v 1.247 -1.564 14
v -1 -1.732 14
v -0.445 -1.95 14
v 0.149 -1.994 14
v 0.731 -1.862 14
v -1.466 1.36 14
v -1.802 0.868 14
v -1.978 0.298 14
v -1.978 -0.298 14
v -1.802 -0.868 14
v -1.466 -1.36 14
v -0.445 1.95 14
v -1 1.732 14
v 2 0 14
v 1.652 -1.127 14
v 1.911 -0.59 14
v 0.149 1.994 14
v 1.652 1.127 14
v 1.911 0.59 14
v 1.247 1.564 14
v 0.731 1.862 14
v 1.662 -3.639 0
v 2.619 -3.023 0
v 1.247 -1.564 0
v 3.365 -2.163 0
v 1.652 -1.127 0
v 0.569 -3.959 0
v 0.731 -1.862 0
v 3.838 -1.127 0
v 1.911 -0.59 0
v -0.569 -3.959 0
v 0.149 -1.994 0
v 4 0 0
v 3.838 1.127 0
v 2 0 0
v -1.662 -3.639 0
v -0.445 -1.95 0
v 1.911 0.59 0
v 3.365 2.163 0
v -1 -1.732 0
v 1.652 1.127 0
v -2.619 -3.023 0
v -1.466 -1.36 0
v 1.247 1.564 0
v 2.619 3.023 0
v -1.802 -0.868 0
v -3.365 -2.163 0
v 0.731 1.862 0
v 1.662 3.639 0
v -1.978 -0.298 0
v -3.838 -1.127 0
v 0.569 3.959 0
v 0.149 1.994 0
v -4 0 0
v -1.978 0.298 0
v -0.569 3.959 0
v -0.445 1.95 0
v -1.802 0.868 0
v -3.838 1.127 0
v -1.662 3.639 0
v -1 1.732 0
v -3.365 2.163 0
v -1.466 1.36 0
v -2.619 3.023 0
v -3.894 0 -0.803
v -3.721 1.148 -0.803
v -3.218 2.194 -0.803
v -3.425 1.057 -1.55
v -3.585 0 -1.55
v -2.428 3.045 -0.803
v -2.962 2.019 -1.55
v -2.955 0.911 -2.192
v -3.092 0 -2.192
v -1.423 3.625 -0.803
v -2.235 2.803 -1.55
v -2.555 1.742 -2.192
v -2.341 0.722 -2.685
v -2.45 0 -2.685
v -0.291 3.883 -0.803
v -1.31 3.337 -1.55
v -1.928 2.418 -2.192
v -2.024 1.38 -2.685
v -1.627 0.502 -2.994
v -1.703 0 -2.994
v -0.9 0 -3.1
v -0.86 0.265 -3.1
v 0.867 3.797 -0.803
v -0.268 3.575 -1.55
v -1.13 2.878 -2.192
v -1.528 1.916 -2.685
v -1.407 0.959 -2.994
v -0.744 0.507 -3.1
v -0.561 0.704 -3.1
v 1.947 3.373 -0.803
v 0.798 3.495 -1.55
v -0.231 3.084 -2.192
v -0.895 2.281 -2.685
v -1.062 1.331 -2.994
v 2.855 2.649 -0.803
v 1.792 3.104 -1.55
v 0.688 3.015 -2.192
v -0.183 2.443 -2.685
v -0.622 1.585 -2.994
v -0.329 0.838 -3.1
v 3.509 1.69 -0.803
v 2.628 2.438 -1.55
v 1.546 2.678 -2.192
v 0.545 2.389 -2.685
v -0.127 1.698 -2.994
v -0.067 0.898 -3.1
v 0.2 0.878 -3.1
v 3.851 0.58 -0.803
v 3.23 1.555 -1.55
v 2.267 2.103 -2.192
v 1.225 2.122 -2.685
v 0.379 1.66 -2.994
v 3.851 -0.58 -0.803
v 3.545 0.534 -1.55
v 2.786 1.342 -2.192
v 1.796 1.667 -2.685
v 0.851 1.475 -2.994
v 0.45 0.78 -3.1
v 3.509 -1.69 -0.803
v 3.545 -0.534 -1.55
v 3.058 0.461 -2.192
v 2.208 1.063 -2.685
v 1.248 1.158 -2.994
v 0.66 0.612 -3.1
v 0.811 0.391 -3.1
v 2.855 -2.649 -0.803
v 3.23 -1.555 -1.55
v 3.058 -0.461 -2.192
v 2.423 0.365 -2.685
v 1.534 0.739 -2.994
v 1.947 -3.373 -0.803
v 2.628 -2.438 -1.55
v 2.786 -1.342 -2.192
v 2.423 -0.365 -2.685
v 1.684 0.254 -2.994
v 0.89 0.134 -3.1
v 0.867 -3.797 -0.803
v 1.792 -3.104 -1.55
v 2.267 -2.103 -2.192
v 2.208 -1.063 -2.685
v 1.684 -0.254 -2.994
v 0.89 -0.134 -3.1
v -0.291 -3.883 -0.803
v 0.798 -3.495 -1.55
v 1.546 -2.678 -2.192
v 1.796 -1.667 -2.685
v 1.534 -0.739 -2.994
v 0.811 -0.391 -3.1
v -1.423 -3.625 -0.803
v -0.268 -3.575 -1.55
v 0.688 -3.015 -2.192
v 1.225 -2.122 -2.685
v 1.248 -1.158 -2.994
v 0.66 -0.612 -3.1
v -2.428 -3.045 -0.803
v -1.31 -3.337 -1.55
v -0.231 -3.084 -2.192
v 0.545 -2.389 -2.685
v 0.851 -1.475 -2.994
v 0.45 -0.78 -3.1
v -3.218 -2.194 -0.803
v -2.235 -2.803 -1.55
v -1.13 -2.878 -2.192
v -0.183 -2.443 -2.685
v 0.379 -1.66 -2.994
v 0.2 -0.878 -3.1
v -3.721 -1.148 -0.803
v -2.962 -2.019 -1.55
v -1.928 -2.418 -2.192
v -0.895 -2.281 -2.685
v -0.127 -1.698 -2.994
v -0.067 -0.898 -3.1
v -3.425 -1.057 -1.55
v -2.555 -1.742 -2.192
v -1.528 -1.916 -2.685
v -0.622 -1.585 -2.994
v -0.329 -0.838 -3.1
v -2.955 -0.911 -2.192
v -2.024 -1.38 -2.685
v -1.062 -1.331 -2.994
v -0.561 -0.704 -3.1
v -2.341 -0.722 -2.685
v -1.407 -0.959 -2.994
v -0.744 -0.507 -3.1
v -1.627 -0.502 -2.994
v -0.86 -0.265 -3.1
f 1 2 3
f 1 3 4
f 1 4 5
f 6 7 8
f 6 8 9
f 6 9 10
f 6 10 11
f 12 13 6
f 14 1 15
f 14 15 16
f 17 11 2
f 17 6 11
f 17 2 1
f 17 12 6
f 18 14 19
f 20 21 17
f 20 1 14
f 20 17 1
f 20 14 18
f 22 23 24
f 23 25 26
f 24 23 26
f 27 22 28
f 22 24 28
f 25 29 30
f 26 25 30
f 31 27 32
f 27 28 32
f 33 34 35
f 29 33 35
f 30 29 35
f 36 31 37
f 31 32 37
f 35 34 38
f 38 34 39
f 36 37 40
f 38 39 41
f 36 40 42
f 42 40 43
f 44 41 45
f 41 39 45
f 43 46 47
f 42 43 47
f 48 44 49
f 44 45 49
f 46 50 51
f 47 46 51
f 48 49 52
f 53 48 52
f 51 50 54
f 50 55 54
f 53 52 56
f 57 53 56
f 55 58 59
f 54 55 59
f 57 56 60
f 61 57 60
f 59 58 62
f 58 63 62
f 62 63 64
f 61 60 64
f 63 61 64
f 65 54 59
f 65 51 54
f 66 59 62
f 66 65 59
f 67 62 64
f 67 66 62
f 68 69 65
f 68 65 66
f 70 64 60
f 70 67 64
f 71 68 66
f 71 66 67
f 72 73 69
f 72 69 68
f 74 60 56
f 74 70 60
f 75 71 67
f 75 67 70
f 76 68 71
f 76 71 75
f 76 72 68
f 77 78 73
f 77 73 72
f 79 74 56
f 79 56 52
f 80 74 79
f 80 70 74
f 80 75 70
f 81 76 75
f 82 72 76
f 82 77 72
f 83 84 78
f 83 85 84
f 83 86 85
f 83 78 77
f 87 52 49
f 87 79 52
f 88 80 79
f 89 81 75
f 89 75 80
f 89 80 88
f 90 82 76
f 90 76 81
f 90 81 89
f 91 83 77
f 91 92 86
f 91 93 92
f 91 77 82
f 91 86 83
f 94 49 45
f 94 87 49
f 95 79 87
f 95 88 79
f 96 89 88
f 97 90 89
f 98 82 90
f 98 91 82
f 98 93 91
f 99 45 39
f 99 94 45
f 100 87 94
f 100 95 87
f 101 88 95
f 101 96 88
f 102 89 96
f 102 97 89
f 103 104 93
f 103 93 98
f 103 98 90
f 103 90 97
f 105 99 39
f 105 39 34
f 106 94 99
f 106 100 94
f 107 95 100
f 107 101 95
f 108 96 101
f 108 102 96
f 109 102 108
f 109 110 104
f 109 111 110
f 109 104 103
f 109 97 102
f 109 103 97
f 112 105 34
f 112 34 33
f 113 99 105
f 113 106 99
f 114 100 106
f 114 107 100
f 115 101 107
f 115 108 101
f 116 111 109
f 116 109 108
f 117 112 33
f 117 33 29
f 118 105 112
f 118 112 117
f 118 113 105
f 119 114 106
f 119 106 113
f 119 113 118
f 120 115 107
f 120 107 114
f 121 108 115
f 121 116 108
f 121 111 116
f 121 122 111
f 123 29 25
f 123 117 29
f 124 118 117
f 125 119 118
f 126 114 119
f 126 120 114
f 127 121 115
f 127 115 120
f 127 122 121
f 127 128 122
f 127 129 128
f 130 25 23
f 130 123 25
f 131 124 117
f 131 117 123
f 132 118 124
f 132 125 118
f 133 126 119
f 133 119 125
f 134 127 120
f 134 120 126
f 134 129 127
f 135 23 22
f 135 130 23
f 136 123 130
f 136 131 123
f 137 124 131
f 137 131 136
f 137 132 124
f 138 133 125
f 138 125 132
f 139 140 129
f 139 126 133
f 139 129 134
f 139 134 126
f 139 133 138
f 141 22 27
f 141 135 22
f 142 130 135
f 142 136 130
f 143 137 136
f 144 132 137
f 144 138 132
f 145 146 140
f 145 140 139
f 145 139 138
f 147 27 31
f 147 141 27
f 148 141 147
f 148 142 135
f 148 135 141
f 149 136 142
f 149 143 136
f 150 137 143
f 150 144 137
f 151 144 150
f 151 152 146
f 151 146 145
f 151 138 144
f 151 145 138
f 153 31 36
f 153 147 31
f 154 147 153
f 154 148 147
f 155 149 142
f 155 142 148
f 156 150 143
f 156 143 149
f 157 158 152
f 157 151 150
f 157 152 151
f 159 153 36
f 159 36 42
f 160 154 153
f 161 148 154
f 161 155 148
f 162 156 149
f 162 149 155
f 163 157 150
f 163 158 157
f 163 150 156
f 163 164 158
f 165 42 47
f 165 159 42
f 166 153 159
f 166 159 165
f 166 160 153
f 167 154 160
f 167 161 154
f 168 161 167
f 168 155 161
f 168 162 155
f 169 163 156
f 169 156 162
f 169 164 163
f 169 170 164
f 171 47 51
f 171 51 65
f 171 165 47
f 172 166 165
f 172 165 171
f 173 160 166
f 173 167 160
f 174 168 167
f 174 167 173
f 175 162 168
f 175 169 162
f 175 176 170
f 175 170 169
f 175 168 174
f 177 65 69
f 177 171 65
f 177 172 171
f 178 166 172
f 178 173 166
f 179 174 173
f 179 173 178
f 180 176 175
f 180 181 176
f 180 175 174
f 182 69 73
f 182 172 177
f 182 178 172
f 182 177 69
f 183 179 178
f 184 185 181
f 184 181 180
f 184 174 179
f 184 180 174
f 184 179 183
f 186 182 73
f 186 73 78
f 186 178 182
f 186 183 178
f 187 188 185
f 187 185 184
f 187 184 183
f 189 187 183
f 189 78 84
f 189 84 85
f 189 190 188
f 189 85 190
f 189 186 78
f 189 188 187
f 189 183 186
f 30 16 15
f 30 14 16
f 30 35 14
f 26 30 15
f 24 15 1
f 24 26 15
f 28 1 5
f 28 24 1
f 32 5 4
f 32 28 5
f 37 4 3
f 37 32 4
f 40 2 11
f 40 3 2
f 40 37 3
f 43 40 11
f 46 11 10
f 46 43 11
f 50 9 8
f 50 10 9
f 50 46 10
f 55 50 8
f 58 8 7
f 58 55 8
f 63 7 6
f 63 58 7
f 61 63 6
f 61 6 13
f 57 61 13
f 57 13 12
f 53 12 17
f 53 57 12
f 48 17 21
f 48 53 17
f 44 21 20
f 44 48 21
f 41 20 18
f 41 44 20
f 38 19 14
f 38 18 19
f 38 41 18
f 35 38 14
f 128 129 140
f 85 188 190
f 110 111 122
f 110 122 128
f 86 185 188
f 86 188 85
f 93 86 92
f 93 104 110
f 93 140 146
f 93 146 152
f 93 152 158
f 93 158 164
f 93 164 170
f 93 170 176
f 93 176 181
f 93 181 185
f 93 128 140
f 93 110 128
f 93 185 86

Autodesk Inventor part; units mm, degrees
ref_plane "YZ Plane" through (0, 0, 0) normal (1, 0, 0) x (0, 1, 0)
ref_plane "XZ Plane" through (0, 0, 0) normal (0, 1, 0) x (-1, 0, 0)
ref_plane "XY Plane" through (0, 0, 0) normal (0, 0, 1) x (1, 0, 0)
sketch "スケッチ1" plane through (0, 0, 0) normal (0, 0, 1) x (1, 0, 0)
  circle A0 centre (0, 0) radius 2
  dimension "d1" = 4
extrude "押し出し1" add sketch "スケッチ1" along normal blind 14
sketch "スケッチ2" plane through (0, 0, 0) normal (0, 0, -1) x (-1, 0, 0)
  circle A0 centre (0, 0) radius 2 projected
  circle A1 centre (0, 0) radius 4
  dimension "d4" = 8
extrude "押し出し2" add sketch "スケッチ2" along normal blind 3.1 contours A0 | A1
fillet "フィレット1" radius 3.1 1 edges at (4, 0, -3.1)
thread "ねじ1" size "M4x0.7" class "6g" standard "ANSI Metric M Profile" full length
properties part number "ネジ鍋m4,14" material "鋼、高強度、低合金"
